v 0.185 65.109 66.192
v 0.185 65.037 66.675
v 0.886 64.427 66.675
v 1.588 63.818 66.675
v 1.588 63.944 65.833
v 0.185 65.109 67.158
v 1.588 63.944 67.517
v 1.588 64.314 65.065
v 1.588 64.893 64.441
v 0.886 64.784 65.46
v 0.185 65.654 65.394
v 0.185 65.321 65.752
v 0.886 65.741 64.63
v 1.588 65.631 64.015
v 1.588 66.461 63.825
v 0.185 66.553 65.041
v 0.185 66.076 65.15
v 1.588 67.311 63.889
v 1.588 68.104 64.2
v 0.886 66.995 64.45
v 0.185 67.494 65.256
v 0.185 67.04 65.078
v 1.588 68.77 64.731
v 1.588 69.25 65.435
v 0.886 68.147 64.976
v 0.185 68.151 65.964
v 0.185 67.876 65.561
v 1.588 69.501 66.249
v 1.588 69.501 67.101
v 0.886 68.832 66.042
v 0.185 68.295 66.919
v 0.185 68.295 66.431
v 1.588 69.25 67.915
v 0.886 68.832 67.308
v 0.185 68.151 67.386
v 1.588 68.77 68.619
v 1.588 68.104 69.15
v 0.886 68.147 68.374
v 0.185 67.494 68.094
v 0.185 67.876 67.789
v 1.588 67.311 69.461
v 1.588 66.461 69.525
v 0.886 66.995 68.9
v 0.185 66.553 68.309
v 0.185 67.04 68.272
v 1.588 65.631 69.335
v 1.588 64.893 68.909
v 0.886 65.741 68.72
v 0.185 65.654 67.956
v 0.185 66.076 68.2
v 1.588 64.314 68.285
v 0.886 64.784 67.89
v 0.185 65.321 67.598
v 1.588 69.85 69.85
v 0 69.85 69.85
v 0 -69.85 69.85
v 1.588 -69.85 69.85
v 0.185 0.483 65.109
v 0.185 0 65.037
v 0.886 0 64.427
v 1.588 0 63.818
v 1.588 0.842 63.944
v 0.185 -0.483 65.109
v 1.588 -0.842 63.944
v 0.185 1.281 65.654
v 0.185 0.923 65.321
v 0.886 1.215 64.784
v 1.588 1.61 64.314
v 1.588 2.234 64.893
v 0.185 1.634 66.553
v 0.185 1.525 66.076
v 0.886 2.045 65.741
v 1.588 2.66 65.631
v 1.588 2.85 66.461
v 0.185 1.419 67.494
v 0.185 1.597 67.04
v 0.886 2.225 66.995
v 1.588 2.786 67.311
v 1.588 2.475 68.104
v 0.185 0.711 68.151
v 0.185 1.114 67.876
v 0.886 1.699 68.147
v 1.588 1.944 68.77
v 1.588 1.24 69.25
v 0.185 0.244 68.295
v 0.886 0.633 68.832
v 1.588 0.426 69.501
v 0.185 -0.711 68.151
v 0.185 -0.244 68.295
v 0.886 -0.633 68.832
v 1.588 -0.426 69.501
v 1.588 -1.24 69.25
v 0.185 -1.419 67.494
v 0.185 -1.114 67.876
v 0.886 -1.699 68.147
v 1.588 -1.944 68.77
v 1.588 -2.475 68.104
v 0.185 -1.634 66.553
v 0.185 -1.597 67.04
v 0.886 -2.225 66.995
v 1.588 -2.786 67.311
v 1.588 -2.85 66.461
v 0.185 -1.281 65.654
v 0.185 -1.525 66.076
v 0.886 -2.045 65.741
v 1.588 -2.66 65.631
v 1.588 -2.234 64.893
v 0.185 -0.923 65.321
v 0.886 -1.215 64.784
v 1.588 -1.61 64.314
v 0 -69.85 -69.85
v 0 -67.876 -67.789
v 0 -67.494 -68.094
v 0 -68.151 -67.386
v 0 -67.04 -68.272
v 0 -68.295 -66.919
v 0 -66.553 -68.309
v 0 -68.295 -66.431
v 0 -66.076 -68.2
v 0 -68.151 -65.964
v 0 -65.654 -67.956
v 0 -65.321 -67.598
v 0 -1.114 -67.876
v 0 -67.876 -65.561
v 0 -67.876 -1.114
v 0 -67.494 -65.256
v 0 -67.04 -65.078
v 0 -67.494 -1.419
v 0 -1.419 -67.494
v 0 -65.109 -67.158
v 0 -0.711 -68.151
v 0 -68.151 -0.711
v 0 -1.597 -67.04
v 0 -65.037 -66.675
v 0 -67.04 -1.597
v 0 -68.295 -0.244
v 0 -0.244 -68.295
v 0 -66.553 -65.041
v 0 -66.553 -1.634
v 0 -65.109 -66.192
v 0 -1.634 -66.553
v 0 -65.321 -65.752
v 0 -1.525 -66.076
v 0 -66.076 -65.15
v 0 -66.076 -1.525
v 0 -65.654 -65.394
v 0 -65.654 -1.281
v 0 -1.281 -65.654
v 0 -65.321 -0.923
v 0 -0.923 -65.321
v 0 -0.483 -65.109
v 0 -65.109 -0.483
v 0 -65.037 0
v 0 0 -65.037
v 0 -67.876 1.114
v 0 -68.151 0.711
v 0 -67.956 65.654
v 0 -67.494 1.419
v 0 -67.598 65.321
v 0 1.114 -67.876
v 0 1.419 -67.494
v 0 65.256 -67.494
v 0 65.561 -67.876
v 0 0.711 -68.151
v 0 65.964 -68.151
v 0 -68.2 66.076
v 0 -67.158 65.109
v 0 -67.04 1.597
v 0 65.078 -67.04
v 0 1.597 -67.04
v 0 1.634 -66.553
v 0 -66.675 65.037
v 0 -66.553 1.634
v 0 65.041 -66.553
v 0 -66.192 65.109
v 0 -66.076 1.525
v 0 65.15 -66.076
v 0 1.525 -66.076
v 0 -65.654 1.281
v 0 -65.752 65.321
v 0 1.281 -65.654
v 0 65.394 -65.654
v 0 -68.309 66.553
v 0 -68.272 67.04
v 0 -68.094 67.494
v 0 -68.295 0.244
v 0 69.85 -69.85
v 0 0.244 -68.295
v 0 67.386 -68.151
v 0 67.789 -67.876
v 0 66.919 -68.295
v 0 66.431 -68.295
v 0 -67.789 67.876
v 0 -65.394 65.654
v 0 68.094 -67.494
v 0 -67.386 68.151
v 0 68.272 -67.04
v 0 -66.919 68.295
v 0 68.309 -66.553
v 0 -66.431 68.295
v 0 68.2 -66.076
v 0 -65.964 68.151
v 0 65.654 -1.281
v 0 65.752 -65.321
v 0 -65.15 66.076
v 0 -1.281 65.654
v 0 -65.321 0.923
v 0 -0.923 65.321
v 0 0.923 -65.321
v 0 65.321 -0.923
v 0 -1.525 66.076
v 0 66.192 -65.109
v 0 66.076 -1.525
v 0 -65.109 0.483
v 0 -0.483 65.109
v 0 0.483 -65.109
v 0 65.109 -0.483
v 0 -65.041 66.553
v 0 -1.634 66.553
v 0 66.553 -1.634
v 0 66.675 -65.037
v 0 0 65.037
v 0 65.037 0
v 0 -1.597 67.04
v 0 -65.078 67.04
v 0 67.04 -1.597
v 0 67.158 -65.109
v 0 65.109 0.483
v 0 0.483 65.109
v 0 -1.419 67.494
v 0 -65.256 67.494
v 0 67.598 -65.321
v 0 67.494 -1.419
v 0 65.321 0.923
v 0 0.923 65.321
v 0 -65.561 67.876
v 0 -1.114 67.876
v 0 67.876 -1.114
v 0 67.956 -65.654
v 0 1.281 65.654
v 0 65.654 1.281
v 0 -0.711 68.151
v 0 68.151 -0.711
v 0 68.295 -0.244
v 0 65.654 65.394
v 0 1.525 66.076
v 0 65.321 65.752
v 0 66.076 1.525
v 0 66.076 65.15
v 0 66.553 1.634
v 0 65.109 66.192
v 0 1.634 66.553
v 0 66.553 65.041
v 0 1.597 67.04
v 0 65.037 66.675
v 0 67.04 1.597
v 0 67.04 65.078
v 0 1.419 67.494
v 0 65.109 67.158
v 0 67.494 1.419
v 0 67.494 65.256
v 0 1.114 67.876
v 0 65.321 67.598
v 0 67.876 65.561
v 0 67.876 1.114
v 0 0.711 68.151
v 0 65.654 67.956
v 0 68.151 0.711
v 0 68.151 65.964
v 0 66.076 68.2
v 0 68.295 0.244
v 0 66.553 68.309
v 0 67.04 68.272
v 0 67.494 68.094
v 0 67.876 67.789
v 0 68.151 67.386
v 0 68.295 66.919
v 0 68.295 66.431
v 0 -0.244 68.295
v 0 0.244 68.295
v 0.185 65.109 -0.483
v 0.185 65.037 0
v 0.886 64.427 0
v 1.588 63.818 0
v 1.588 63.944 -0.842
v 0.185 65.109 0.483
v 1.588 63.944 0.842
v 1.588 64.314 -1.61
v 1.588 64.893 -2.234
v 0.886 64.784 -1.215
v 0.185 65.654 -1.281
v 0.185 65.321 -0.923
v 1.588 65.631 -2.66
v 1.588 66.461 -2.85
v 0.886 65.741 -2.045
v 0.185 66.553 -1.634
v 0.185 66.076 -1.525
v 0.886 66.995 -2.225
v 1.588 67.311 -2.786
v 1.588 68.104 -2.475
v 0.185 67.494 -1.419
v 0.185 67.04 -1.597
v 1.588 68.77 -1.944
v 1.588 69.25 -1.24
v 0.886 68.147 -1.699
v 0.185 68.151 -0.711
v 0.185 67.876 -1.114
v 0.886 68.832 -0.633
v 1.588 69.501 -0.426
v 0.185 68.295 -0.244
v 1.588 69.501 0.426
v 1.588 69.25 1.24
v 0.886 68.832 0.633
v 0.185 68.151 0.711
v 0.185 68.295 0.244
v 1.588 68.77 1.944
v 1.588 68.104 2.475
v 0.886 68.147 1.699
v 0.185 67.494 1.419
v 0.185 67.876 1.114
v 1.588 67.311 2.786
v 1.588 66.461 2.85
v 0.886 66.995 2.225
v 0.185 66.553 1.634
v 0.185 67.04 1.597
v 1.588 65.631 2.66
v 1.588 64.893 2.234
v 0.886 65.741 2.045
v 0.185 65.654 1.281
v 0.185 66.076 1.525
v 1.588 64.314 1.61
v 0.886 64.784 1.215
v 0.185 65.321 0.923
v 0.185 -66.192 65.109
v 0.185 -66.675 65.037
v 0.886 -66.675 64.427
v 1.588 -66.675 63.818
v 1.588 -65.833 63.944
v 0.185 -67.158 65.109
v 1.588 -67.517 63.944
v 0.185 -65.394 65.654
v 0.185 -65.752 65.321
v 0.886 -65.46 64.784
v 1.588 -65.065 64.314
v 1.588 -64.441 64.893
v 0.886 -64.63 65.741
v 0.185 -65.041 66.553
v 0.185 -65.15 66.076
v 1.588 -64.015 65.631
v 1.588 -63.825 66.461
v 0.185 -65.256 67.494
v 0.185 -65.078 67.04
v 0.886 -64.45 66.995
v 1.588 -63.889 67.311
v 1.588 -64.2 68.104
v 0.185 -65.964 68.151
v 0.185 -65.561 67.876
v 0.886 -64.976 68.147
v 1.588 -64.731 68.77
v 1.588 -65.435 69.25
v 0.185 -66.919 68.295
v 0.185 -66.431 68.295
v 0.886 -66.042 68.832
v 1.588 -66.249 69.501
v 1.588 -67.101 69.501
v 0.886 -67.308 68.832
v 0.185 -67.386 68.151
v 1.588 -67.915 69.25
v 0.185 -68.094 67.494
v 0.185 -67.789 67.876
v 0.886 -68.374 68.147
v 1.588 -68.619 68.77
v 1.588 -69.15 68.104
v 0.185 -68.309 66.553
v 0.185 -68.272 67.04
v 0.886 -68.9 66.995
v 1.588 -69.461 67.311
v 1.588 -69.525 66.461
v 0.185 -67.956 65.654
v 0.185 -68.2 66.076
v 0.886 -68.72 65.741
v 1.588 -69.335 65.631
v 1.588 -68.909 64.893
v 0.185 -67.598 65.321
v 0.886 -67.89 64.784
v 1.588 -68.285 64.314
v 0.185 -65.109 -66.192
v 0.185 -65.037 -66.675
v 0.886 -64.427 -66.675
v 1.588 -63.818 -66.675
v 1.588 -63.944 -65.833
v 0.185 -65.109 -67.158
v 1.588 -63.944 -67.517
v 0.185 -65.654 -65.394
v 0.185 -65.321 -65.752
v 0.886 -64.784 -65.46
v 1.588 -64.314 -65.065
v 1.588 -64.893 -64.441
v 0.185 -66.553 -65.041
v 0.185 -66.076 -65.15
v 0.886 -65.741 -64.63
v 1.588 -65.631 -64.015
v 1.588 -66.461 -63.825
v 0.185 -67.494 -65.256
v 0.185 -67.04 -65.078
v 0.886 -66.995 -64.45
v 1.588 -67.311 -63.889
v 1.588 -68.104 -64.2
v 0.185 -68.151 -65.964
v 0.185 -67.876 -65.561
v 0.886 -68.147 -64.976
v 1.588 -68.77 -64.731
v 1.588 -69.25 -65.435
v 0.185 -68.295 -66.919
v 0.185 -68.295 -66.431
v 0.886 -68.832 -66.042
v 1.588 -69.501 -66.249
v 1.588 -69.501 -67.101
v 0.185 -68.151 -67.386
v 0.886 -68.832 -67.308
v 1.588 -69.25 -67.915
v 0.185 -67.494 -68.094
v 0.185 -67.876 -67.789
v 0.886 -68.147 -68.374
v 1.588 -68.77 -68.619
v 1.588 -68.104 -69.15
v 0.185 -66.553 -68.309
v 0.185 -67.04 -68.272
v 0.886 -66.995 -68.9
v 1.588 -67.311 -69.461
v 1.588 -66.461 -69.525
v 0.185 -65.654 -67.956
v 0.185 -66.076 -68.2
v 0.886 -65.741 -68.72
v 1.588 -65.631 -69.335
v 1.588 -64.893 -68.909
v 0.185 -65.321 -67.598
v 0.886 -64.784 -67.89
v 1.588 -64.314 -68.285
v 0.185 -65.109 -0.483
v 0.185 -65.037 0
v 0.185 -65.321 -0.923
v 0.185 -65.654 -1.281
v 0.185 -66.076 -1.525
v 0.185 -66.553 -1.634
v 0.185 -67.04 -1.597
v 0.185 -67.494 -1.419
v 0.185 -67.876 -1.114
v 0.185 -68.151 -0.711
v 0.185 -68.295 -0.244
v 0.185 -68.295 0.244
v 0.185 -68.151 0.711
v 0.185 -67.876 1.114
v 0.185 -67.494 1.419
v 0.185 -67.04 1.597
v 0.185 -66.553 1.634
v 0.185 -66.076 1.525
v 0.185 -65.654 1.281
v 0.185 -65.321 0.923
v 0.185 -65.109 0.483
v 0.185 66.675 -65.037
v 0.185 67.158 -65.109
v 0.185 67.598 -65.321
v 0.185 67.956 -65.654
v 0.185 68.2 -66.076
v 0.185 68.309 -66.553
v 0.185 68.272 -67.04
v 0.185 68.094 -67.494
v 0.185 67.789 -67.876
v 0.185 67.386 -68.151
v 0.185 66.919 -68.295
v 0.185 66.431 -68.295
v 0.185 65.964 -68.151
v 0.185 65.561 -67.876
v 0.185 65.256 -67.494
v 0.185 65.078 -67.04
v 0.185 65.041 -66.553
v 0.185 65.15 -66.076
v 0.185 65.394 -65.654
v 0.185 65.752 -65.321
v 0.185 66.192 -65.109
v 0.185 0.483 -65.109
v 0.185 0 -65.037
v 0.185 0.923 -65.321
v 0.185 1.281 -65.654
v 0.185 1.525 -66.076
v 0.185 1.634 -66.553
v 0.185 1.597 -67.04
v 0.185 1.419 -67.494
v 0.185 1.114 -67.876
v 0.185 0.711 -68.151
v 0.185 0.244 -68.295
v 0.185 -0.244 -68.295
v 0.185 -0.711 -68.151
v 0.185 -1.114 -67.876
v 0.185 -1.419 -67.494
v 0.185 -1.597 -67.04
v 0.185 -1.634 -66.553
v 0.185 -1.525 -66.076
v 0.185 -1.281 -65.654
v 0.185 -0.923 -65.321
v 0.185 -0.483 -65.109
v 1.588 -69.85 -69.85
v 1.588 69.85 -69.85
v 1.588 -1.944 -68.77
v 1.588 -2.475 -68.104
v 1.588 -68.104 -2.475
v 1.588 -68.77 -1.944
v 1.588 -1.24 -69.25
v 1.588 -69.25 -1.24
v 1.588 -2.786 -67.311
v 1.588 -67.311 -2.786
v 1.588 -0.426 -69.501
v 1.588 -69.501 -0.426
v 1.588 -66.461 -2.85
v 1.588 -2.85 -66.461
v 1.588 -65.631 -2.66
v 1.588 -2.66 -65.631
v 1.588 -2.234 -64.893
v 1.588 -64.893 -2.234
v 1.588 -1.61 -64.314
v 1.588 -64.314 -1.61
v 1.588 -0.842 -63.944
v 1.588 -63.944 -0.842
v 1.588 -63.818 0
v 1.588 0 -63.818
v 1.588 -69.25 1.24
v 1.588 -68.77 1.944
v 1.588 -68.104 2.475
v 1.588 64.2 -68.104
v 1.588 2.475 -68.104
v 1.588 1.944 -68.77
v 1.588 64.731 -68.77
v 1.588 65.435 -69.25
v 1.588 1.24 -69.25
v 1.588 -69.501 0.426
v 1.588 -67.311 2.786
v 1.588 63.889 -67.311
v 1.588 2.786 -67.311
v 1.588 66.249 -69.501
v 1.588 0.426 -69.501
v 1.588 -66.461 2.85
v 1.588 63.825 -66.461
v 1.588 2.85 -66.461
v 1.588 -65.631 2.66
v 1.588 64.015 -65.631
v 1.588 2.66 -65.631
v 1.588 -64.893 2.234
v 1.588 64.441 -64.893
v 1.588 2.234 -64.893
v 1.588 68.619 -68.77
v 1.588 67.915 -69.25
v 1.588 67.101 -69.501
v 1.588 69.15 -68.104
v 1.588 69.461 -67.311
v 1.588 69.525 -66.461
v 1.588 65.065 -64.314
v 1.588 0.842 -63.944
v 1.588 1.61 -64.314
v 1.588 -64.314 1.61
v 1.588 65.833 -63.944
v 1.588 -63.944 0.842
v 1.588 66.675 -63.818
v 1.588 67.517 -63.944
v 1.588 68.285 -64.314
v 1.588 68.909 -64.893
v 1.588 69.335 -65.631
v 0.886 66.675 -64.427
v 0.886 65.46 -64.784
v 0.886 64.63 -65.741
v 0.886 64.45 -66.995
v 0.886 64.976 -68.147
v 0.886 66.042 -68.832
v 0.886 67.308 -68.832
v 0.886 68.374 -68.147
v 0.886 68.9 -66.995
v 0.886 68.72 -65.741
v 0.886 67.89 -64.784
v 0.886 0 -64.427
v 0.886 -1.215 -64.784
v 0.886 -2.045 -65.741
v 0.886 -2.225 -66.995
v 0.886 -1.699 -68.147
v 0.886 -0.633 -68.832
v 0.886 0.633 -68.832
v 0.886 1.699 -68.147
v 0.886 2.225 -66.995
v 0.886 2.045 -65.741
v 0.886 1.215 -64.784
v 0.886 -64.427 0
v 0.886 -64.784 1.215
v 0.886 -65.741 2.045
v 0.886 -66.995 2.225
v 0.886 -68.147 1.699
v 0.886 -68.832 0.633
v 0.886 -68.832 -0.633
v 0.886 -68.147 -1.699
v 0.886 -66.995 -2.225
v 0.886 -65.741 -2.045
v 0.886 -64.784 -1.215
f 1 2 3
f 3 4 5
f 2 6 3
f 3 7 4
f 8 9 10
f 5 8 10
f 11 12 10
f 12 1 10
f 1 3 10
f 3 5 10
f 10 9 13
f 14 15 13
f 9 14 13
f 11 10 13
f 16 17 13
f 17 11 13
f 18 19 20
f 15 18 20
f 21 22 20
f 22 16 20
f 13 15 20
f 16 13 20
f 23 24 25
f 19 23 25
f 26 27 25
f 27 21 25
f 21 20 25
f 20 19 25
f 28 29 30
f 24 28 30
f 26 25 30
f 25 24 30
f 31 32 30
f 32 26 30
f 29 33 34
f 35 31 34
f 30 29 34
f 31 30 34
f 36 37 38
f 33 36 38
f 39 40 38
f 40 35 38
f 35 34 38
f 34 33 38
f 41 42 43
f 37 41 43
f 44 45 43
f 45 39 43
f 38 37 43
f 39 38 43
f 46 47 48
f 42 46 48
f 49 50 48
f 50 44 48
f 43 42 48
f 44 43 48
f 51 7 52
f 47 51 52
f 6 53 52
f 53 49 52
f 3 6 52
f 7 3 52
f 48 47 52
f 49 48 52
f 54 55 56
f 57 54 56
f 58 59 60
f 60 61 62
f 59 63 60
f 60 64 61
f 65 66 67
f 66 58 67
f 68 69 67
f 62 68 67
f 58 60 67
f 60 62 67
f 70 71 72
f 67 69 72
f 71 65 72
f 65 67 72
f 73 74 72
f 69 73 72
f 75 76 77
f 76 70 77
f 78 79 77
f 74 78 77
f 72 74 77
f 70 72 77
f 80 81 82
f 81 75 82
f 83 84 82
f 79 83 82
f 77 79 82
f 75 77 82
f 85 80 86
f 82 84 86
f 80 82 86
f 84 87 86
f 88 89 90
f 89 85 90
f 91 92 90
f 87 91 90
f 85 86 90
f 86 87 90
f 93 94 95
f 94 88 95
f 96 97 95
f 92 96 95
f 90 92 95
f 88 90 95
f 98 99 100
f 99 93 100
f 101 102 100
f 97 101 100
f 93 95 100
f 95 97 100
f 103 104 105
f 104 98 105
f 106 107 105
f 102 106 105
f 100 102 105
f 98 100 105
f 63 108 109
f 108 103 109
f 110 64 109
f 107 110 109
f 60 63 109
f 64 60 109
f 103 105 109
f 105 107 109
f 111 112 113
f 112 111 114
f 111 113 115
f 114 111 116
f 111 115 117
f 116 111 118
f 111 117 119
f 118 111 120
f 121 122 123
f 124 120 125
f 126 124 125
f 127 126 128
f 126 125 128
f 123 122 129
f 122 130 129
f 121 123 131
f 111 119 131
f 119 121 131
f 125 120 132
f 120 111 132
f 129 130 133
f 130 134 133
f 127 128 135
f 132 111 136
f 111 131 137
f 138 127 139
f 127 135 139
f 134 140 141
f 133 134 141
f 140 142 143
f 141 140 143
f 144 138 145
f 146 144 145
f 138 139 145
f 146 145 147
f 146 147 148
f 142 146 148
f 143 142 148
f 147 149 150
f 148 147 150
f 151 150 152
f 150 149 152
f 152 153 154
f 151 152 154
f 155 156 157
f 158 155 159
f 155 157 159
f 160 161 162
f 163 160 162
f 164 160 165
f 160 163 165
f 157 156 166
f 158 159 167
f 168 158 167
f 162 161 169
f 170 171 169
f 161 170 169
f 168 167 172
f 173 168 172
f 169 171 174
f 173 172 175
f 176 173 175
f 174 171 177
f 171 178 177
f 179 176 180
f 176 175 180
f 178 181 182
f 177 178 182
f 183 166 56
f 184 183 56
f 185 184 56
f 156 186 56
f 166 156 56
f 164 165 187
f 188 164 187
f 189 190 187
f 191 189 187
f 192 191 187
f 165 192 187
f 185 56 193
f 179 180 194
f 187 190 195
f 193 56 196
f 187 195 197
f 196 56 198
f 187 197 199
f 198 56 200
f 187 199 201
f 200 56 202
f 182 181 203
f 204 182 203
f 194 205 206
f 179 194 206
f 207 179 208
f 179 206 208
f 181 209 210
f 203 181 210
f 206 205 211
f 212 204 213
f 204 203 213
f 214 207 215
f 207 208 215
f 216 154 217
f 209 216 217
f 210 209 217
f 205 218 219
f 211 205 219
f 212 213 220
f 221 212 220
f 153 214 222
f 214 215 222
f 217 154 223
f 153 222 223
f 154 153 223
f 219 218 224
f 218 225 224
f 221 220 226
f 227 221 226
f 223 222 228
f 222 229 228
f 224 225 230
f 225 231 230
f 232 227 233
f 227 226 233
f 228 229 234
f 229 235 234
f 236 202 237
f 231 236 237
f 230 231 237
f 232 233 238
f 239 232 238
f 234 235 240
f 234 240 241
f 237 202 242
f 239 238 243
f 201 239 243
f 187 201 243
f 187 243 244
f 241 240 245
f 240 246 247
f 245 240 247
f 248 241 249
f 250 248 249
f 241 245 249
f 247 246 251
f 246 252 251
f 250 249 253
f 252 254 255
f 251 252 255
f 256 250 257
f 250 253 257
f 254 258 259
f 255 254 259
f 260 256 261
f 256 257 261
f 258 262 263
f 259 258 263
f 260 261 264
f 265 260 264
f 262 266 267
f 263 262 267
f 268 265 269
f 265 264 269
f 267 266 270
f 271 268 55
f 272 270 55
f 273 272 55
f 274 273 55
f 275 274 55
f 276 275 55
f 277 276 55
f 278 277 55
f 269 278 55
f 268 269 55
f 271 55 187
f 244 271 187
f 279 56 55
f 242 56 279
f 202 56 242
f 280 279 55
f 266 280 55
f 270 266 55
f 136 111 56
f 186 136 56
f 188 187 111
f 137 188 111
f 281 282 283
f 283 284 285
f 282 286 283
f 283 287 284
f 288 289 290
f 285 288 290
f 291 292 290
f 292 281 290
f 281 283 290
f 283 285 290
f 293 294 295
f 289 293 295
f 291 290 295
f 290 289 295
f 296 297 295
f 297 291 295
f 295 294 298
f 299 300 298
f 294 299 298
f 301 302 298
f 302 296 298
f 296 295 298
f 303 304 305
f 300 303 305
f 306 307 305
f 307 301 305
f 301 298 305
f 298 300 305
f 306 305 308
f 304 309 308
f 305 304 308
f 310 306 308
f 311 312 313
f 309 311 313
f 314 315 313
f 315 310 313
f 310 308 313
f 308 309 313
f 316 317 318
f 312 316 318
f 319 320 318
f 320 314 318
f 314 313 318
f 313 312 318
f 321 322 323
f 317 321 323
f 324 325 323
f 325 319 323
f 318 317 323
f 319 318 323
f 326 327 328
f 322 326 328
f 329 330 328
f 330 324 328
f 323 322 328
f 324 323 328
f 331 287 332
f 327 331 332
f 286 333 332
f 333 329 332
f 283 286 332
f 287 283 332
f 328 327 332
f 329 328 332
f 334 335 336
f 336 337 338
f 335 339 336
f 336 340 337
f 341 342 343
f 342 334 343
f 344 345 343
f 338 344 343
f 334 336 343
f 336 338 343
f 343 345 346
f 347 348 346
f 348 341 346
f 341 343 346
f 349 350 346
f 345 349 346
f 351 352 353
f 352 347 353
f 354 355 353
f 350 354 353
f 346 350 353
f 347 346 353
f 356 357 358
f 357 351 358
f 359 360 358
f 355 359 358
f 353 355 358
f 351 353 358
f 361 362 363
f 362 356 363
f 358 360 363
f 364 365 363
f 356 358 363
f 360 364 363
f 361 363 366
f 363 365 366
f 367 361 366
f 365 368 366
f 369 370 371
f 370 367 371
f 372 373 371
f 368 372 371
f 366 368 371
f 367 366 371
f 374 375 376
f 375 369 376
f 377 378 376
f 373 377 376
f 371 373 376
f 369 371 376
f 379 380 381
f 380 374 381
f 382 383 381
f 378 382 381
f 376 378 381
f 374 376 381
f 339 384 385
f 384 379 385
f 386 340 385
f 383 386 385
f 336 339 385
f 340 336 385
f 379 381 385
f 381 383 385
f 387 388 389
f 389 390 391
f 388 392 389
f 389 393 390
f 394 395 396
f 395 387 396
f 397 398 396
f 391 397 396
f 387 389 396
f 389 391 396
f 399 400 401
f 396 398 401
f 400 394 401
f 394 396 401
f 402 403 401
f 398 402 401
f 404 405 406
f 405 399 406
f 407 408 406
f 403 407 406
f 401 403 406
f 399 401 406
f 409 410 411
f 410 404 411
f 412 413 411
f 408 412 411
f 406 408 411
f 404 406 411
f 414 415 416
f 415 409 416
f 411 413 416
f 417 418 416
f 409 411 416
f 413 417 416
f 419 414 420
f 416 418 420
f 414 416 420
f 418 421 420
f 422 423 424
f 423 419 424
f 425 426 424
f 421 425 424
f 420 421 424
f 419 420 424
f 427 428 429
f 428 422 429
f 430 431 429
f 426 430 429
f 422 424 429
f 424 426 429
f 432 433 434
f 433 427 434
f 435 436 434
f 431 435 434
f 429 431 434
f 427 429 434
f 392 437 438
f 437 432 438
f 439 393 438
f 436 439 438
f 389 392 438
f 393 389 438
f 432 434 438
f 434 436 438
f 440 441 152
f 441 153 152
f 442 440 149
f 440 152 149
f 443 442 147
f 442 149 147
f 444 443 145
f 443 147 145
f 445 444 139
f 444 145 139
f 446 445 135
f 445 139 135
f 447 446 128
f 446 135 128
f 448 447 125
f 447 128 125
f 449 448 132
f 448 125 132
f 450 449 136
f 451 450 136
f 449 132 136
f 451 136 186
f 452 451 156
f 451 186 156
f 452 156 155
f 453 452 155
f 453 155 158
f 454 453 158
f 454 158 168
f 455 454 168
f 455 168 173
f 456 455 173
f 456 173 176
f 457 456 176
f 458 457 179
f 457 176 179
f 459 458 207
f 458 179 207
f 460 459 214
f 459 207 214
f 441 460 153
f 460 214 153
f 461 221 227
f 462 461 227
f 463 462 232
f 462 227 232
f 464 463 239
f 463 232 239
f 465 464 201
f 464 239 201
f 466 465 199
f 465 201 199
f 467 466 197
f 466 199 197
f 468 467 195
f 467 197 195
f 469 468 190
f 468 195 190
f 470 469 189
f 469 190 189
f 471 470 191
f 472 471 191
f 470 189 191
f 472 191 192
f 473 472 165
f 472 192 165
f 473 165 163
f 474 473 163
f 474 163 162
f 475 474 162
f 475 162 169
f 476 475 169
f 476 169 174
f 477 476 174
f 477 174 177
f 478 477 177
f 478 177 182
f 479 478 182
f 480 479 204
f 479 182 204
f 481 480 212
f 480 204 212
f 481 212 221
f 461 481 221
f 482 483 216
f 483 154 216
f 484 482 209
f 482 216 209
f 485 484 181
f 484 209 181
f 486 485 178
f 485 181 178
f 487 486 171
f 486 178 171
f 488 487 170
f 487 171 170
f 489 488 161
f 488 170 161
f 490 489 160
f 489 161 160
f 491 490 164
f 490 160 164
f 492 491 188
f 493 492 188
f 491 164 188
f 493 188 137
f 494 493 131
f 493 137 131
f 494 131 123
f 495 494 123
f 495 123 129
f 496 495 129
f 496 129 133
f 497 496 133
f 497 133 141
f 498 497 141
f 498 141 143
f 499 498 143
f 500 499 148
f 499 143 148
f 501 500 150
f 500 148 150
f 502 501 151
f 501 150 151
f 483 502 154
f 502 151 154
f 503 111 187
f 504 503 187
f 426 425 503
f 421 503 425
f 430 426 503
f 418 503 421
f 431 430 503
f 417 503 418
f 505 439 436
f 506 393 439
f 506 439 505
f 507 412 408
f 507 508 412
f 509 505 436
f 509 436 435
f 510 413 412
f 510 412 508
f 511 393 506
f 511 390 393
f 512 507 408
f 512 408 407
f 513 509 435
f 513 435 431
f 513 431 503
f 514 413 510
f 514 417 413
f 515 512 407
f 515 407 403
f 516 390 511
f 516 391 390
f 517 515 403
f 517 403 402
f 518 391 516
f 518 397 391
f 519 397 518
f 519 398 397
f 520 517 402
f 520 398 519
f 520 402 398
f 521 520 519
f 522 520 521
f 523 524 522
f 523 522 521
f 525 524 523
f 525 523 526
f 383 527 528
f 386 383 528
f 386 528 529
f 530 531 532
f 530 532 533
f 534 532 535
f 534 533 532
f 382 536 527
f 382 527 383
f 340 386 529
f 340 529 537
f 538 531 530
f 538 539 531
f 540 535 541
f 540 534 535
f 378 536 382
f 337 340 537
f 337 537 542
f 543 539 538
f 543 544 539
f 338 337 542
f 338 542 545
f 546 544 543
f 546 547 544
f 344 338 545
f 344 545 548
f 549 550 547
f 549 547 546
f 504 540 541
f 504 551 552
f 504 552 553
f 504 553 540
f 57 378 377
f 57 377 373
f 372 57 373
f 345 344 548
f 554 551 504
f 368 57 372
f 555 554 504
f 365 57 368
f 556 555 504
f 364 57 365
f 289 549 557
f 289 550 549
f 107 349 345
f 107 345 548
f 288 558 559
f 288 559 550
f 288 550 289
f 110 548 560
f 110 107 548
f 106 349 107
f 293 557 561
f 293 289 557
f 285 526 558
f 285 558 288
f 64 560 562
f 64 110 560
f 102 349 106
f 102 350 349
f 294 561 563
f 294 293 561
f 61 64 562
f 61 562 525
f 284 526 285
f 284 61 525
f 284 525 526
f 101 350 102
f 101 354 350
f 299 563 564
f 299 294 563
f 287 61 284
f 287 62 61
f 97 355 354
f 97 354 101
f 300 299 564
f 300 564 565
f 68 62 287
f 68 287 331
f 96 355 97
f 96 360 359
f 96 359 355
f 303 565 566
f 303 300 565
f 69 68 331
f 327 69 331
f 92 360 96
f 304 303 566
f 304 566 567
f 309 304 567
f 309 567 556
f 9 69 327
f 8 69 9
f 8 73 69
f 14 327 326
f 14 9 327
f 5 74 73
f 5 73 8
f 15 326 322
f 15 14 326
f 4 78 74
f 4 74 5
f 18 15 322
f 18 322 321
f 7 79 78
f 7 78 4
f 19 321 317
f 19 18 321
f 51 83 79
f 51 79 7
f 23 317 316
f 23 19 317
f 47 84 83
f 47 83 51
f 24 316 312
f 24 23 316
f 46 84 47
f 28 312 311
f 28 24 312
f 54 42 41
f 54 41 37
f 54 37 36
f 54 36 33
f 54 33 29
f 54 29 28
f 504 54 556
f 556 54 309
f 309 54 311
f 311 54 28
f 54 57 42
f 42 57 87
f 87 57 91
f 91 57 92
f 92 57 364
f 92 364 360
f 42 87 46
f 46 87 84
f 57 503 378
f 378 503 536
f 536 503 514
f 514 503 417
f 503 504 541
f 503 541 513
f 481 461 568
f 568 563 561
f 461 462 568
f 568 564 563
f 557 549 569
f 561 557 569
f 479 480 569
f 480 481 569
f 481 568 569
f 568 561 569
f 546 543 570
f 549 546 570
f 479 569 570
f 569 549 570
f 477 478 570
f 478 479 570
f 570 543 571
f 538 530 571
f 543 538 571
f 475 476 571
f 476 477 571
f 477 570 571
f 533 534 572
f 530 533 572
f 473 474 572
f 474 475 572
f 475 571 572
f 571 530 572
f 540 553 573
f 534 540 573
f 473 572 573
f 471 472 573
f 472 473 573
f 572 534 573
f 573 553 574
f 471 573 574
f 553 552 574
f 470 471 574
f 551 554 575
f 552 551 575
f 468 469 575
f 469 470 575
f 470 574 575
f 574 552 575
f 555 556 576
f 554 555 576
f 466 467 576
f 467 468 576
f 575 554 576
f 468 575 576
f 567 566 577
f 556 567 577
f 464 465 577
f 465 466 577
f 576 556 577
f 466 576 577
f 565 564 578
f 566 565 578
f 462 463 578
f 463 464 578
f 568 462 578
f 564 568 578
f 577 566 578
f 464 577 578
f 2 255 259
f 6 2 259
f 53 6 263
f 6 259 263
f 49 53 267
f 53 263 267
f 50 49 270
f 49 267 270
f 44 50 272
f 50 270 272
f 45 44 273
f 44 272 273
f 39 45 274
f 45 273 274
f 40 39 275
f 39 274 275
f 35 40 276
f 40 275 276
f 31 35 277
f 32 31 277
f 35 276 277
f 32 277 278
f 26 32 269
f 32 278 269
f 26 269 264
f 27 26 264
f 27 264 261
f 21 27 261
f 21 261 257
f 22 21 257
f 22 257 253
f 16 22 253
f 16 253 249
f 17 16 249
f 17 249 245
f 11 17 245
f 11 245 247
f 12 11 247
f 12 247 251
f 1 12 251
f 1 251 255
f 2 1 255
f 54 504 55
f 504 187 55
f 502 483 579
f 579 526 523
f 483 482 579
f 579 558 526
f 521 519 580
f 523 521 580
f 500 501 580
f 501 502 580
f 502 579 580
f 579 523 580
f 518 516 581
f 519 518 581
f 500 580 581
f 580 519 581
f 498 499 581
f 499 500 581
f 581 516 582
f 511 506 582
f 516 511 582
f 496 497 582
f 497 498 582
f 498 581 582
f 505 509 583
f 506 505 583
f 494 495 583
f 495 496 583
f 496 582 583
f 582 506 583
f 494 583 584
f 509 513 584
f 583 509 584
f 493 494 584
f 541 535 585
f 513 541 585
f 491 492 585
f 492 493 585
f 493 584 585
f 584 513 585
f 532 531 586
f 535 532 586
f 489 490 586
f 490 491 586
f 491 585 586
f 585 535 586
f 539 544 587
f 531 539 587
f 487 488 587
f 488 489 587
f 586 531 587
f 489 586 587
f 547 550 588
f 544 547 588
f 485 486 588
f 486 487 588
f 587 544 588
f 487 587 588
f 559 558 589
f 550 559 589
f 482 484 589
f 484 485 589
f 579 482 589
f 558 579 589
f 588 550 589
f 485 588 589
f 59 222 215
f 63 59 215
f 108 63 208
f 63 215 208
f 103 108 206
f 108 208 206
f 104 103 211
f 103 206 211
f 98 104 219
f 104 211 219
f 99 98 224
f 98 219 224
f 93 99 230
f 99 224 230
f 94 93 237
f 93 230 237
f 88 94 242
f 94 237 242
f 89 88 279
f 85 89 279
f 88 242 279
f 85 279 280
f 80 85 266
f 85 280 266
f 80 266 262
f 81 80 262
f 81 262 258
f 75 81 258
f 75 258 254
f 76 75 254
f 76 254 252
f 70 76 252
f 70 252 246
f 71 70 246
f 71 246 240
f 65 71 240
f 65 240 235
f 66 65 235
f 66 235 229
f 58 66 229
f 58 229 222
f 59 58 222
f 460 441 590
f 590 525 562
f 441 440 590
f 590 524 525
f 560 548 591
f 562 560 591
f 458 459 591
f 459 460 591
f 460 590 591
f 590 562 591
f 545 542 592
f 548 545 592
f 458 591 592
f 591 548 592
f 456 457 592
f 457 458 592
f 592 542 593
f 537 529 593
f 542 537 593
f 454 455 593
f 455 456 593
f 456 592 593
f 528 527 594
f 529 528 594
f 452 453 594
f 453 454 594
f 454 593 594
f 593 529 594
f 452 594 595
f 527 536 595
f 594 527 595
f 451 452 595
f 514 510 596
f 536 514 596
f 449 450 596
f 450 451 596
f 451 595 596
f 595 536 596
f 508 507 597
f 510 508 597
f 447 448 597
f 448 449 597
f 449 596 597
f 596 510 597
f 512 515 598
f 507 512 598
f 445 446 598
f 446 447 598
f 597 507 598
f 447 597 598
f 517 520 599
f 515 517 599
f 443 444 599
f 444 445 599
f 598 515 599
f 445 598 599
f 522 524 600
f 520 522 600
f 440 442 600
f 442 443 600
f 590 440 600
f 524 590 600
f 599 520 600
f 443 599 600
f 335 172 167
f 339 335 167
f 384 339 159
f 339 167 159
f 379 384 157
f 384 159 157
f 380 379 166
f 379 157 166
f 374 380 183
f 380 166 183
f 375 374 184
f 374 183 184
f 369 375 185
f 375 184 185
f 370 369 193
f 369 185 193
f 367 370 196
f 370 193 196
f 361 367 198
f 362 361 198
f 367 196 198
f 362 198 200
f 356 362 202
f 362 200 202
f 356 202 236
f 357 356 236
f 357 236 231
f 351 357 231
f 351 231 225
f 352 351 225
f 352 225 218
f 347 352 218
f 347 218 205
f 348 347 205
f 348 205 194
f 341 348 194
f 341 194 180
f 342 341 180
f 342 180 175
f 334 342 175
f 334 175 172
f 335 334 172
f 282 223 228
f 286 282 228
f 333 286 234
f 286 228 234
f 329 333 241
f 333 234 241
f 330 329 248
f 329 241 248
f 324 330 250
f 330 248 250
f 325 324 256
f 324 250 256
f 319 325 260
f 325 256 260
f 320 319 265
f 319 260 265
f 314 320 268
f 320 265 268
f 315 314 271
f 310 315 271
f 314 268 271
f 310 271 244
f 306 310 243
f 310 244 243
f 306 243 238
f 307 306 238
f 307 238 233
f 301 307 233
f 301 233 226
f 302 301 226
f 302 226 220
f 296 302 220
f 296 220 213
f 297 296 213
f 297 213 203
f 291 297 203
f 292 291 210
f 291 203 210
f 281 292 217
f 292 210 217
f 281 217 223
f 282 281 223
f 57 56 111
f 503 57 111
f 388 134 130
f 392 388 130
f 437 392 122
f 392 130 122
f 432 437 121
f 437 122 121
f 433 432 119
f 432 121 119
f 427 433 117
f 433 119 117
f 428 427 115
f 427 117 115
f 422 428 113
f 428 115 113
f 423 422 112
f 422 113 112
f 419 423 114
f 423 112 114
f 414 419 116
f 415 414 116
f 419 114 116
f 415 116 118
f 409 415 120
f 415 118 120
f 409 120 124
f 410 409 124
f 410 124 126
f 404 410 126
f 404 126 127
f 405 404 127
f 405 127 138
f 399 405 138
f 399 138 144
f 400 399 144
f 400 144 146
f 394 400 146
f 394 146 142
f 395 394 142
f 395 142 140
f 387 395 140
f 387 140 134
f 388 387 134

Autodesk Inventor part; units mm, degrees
ref_plane "YZ Plane" through (0, 0, 0) normal (1, 0, 0) x (0, 1, 0)
ref_plane "XZ Plane" through (0, 0, 0) normal (0, 1, 0) x (-1, 0, 0)
ref_plane "XY Plane" through (0, 0, 0) normal (0, 0, 1) x (1, 0, 0)
sketch "Sketch1" plane through (0, 0, 0) normal (1, 0, 0) x (0, 1, 0)
  line L0 (-69.85, -69.85) -> (69.85, -69.85)
  line L1 (69.85, -69.85) -> (69.85, 69.85)
  line L2 (69.85, 69.85) -> (-69.85, 69.85)
  line L3 (-69.85, 69.85) -> (-69.85, -69.85)
  line L4 (-69.85, -69.85) -> (69.85, 69.85) construction
  line L5 (69.85, -69.85) -> (-69.85, 69.85) construction
  point P0 (0, 0)
  dimension "d0" = 139.7
  dimension "d1" = 139.7
extrude "Extrusion1" add sketch "Sketch1" along normal blind 1.5875
sketch "Sketch6" plane through (1.5875, 0, 0) normal (1, 0, 0) x (0, 0, -1)
  line L0 (69.85, -69.85) -> (69.85, 69.85) projected
  line L1 (69.85, 69.85) -> (-69.85, 69.85) projected
  line L2 (-69.85, 69.85) -> (-69.85, -69.85) projected
  line L3 (-69.85, -69.85) -> (69.85, -69.85) projected
  point P0 (0, 0)
  point P1 (-66.675, -66.675)
  point P2 (-66.675, 0)
  dimension "d45" = 3.175
  dimension "d46" = 3.175
  dimension "d57" = 69.85
hole "Hole4" at (1.5875, -66.675, 66.675) at (1.5875, 0, 66.675) direction (-1, 0, 0) diameter 3.2766 end through all countersink diameter 5.715 countersink angle 82 clearance for "Flat Head Machine Screw (82)" size "#4" standard "Ansi Unified Screw Threads"
pattern_circular "Circular Pattern1" count 4 over 360 about axis through (-10, 0, 0) along (1, 0, 0) of "Hole4"
equation "\"d0\" = width + 2 * plasticThickness"
equation "\"d1\" = height + 2 * plasticThickness"
equation "\"d2\" = frontPanelThickness"
equation "\"d45\" = 0.5 * caseThickness"
equation "\"d46\" = 0.5 * caseThickness"
equation "\"d57\" = 0.5 * width + caseThickness"
equation "\"height\" = 127"
equation "\"width\" = 127"
equation "\"plasticThickness\" = 6.35"
equation "\"caseThickness\" = 6.35"
equation "\"alignmentGrooveDepth\" = 1.5875"
equation "\"alignmentGrooveClearance\" = 0.1016"
equation "\"aerogelHolderDepth\" = 49.022"
equation "\"depth\" = 203.2"
equation "\"mirrorAngle\" = 2.5deg"
equation "\"mirrorThickness\" = 3.175"
equation "\"fresnelThickness\" = 0.254"
equation "\"focalLength\" = 152.4"
equation "\"ior\" = 1.49"
equation "\"centerThickness\" = 1.27"
equation "\"fresnelAngle\" = 90deg"
equation "\"fresnelEffectiveDiameter\" = 152.4"
equation "\"frontPanelThickness\" = 1.5875"
equation "\"fresnelGrooveWidth\" = 1.778"
properties part number "front" material "Aluminum 6061"
